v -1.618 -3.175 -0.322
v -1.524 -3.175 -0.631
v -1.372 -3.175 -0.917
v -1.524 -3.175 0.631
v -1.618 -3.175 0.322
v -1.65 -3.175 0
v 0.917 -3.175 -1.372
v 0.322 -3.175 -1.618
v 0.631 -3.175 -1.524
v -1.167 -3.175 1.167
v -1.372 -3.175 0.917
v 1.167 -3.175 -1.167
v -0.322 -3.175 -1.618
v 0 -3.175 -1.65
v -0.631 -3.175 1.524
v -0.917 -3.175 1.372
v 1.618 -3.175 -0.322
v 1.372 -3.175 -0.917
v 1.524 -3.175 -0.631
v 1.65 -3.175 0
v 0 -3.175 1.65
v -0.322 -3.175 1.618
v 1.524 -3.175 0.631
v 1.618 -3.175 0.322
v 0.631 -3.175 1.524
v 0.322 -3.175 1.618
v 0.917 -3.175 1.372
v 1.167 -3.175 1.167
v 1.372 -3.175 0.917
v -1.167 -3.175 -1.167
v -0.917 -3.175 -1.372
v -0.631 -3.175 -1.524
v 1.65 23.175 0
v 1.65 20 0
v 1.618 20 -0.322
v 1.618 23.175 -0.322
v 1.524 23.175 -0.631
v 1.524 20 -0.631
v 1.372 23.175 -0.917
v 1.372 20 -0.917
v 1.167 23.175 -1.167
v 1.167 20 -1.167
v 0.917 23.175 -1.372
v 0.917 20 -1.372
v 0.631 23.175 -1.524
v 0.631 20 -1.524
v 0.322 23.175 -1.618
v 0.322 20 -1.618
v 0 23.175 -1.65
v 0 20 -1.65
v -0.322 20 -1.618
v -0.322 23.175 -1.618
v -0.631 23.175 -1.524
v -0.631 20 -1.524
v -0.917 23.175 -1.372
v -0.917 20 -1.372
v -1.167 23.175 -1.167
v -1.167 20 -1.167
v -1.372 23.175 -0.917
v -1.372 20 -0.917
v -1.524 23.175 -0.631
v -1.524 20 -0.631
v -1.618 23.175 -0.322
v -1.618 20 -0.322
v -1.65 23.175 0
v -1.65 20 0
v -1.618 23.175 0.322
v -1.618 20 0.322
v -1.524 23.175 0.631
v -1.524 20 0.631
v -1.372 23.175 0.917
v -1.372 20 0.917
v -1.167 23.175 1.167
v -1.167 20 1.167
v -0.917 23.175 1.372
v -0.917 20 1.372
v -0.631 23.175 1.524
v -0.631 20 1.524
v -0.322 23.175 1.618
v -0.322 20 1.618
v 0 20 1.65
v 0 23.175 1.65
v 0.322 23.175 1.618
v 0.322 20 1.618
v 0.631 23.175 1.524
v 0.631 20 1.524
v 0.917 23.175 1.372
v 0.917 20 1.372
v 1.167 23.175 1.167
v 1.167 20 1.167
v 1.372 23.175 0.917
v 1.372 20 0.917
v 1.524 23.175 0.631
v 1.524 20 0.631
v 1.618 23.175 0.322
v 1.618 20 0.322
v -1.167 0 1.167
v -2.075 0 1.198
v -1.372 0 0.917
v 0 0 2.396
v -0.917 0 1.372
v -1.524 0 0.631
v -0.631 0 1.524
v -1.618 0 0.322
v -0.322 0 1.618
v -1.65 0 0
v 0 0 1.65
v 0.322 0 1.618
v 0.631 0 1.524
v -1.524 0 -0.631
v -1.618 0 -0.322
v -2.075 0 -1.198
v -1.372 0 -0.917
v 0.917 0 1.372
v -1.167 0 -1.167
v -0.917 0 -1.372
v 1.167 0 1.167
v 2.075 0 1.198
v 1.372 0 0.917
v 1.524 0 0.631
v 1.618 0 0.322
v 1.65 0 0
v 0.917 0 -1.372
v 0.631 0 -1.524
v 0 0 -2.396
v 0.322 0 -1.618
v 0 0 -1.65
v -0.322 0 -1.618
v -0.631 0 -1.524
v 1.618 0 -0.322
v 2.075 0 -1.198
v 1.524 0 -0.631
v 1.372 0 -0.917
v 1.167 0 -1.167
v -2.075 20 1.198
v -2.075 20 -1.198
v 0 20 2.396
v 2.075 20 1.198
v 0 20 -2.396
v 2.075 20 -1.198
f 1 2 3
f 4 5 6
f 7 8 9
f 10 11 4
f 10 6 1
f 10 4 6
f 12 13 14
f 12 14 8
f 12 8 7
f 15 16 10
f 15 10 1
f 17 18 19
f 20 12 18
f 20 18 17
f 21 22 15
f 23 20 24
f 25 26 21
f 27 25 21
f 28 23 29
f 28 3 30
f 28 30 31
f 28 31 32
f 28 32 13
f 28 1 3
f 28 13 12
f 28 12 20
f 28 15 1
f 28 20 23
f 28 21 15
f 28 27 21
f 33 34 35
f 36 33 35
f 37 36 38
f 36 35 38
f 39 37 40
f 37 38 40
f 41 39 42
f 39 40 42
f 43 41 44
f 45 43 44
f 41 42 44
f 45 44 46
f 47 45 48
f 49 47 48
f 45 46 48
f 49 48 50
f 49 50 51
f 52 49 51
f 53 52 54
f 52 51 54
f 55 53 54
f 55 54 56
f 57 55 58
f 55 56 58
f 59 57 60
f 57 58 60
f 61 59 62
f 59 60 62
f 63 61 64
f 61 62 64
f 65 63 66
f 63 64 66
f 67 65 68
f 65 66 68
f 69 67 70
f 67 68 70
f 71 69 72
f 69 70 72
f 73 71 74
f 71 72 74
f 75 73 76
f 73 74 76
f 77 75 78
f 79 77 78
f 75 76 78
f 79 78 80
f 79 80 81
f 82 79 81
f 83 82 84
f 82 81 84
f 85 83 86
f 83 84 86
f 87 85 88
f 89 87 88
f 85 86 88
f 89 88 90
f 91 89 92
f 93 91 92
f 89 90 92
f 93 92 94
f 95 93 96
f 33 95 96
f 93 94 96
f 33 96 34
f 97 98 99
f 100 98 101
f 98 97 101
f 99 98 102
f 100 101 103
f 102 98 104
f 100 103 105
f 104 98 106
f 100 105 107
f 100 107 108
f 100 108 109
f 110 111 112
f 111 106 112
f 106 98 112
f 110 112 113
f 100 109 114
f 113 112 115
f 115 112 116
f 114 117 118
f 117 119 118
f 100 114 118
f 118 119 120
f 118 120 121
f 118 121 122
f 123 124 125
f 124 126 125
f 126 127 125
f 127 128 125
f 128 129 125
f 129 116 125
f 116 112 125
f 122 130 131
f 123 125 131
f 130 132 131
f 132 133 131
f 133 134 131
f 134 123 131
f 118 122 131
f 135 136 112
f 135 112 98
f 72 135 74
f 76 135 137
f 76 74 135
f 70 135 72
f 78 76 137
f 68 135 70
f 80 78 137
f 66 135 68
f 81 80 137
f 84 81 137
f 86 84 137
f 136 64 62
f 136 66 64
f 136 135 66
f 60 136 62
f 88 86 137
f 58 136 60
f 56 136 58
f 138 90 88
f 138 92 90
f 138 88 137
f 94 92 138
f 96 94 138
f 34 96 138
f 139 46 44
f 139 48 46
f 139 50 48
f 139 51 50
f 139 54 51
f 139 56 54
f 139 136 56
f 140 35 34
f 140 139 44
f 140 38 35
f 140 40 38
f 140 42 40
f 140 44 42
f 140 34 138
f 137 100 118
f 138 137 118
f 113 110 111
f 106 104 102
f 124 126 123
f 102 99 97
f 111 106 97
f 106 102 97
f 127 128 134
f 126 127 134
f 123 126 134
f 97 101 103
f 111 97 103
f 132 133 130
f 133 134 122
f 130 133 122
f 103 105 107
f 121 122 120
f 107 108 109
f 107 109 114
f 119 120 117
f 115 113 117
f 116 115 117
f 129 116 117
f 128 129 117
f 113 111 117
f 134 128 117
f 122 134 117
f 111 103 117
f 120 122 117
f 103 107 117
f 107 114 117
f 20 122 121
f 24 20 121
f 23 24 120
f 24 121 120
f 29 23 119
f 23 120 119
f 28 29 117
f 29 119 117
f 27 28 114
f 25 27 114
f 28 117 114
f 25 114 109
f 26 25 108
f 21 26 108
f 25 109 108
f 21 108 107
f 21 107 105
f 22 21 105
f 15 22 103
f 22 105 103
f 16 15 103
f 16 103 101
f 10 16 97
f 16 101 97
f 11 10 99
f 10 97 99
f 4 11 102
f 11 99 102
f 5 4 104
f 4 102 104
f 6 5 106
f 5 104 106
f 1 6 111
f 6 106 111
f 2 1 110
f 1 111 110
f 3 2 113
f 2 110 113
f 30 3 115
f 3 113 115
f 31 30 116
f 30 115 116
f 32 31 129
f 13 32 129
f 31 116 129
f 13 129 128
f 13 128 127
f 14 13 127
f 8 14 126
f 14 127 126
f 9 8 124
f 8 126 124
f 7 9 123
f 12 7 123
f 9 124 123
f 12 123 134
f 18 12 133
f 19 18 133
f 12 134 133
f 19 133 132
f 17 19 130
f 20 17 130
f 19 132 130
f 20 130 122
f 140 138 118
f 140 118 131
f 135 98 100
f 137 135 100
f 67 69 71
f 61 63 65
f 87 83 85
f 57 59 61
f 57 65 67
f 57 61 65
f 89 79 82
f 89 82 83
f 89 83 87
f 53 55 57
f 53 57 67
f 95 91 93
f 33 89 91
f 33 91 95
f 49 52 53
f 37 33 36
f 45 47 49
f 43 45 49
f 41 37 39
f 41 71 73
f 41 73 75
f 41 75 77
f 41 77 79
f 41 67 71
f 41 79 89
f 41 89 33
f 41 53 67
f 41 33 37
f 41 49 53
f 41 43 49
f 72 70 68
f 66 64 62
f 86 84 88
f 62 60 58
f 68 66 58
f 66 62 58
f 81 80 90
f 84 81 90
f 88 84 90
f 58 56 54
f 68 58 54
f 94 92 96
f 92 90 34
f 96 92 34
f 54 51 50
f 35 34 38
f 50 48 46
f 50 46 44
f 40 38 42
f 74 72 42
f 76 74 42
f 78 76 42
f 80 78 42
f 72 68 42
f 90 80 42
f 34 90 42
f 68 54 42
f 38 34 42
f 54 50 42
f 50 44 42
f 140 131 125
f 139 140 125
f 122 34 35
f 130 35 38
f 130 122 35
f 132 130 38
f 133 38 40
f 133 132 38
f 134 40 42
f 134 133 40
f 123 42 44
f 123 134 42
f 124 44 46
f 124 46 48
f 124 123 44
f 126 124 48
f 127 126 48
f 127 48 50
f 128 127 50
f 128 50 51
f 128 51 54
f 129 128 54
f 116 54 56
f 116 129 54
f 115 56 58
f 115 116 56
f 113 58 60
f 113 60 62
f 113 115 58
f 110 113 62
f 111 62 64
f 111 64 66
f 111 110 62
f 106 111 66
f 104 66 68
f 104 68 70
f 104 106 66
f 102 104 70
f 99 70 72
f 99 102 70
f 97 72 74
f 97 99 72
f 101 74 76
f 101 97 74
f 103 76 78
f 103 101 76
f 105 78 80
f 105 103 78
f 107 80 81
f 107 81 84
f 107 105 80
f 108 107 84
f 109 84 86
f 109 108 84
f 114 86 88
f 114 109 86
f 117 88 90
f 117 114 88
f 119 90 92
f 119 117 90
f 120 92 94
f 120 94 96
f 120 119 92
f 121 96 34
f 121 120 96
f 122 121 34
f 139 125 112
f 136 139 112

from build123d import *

# Parameters (mm, degrees)
SKETCH1_R           = 1.65
BOSS_EXTRUDE1_DEPTH = 20
SKETCH2_R           = 1.65
BOSS_EXTRUDE2_DEPTH = 3.175
SKETCH3_R           = 1.65
BOSS_EXTRUDE3_DEPTH = 3.175


with BuildPart() as part:
    # Sketch1 → Boss-Extrude1 (new body)
    with BuildSketch(Plane(origin=(0, 0, 0), x_dir=(1, 0, 0), z_dir=(0, 1, 0))):
        Polygon((0, -2.396003617), (2.075, -1.198001809), (2.075, 1.198001809), (0, 2.396003617), (-2.075, 1.198001809), (-2.075, -1.198001809), align=None)
        Circle(SKETCH1_R, mode=Mode.SUBTRACT)
    extrude(amount=BOSS_EXTRUDE1_DEPTH)


with BuildPart() as body_2:
    # Sketch2 → Boss-Extrude2 (new body)
    with BuildSketch(Plane.XZ):
        Circle(SKETCH2_R)
    extrude(amount=BOSS_EXTRUDE2_DEPTH)


with BuildPart() as body_3:
    # Sketch3 → Boss-Extrude3 (new body)
    with BuildSketch(Plane(origin=(0, 20, 0), x_dir=(1, 0, 0), z_dir=(0, 1, 0))):
        Circle(SKETCH3_R)
    extrude(amount=BOSS_EXTRUDE3_DEPTH)


solid = Compound([part.part, body_2.part, body_3.part])
